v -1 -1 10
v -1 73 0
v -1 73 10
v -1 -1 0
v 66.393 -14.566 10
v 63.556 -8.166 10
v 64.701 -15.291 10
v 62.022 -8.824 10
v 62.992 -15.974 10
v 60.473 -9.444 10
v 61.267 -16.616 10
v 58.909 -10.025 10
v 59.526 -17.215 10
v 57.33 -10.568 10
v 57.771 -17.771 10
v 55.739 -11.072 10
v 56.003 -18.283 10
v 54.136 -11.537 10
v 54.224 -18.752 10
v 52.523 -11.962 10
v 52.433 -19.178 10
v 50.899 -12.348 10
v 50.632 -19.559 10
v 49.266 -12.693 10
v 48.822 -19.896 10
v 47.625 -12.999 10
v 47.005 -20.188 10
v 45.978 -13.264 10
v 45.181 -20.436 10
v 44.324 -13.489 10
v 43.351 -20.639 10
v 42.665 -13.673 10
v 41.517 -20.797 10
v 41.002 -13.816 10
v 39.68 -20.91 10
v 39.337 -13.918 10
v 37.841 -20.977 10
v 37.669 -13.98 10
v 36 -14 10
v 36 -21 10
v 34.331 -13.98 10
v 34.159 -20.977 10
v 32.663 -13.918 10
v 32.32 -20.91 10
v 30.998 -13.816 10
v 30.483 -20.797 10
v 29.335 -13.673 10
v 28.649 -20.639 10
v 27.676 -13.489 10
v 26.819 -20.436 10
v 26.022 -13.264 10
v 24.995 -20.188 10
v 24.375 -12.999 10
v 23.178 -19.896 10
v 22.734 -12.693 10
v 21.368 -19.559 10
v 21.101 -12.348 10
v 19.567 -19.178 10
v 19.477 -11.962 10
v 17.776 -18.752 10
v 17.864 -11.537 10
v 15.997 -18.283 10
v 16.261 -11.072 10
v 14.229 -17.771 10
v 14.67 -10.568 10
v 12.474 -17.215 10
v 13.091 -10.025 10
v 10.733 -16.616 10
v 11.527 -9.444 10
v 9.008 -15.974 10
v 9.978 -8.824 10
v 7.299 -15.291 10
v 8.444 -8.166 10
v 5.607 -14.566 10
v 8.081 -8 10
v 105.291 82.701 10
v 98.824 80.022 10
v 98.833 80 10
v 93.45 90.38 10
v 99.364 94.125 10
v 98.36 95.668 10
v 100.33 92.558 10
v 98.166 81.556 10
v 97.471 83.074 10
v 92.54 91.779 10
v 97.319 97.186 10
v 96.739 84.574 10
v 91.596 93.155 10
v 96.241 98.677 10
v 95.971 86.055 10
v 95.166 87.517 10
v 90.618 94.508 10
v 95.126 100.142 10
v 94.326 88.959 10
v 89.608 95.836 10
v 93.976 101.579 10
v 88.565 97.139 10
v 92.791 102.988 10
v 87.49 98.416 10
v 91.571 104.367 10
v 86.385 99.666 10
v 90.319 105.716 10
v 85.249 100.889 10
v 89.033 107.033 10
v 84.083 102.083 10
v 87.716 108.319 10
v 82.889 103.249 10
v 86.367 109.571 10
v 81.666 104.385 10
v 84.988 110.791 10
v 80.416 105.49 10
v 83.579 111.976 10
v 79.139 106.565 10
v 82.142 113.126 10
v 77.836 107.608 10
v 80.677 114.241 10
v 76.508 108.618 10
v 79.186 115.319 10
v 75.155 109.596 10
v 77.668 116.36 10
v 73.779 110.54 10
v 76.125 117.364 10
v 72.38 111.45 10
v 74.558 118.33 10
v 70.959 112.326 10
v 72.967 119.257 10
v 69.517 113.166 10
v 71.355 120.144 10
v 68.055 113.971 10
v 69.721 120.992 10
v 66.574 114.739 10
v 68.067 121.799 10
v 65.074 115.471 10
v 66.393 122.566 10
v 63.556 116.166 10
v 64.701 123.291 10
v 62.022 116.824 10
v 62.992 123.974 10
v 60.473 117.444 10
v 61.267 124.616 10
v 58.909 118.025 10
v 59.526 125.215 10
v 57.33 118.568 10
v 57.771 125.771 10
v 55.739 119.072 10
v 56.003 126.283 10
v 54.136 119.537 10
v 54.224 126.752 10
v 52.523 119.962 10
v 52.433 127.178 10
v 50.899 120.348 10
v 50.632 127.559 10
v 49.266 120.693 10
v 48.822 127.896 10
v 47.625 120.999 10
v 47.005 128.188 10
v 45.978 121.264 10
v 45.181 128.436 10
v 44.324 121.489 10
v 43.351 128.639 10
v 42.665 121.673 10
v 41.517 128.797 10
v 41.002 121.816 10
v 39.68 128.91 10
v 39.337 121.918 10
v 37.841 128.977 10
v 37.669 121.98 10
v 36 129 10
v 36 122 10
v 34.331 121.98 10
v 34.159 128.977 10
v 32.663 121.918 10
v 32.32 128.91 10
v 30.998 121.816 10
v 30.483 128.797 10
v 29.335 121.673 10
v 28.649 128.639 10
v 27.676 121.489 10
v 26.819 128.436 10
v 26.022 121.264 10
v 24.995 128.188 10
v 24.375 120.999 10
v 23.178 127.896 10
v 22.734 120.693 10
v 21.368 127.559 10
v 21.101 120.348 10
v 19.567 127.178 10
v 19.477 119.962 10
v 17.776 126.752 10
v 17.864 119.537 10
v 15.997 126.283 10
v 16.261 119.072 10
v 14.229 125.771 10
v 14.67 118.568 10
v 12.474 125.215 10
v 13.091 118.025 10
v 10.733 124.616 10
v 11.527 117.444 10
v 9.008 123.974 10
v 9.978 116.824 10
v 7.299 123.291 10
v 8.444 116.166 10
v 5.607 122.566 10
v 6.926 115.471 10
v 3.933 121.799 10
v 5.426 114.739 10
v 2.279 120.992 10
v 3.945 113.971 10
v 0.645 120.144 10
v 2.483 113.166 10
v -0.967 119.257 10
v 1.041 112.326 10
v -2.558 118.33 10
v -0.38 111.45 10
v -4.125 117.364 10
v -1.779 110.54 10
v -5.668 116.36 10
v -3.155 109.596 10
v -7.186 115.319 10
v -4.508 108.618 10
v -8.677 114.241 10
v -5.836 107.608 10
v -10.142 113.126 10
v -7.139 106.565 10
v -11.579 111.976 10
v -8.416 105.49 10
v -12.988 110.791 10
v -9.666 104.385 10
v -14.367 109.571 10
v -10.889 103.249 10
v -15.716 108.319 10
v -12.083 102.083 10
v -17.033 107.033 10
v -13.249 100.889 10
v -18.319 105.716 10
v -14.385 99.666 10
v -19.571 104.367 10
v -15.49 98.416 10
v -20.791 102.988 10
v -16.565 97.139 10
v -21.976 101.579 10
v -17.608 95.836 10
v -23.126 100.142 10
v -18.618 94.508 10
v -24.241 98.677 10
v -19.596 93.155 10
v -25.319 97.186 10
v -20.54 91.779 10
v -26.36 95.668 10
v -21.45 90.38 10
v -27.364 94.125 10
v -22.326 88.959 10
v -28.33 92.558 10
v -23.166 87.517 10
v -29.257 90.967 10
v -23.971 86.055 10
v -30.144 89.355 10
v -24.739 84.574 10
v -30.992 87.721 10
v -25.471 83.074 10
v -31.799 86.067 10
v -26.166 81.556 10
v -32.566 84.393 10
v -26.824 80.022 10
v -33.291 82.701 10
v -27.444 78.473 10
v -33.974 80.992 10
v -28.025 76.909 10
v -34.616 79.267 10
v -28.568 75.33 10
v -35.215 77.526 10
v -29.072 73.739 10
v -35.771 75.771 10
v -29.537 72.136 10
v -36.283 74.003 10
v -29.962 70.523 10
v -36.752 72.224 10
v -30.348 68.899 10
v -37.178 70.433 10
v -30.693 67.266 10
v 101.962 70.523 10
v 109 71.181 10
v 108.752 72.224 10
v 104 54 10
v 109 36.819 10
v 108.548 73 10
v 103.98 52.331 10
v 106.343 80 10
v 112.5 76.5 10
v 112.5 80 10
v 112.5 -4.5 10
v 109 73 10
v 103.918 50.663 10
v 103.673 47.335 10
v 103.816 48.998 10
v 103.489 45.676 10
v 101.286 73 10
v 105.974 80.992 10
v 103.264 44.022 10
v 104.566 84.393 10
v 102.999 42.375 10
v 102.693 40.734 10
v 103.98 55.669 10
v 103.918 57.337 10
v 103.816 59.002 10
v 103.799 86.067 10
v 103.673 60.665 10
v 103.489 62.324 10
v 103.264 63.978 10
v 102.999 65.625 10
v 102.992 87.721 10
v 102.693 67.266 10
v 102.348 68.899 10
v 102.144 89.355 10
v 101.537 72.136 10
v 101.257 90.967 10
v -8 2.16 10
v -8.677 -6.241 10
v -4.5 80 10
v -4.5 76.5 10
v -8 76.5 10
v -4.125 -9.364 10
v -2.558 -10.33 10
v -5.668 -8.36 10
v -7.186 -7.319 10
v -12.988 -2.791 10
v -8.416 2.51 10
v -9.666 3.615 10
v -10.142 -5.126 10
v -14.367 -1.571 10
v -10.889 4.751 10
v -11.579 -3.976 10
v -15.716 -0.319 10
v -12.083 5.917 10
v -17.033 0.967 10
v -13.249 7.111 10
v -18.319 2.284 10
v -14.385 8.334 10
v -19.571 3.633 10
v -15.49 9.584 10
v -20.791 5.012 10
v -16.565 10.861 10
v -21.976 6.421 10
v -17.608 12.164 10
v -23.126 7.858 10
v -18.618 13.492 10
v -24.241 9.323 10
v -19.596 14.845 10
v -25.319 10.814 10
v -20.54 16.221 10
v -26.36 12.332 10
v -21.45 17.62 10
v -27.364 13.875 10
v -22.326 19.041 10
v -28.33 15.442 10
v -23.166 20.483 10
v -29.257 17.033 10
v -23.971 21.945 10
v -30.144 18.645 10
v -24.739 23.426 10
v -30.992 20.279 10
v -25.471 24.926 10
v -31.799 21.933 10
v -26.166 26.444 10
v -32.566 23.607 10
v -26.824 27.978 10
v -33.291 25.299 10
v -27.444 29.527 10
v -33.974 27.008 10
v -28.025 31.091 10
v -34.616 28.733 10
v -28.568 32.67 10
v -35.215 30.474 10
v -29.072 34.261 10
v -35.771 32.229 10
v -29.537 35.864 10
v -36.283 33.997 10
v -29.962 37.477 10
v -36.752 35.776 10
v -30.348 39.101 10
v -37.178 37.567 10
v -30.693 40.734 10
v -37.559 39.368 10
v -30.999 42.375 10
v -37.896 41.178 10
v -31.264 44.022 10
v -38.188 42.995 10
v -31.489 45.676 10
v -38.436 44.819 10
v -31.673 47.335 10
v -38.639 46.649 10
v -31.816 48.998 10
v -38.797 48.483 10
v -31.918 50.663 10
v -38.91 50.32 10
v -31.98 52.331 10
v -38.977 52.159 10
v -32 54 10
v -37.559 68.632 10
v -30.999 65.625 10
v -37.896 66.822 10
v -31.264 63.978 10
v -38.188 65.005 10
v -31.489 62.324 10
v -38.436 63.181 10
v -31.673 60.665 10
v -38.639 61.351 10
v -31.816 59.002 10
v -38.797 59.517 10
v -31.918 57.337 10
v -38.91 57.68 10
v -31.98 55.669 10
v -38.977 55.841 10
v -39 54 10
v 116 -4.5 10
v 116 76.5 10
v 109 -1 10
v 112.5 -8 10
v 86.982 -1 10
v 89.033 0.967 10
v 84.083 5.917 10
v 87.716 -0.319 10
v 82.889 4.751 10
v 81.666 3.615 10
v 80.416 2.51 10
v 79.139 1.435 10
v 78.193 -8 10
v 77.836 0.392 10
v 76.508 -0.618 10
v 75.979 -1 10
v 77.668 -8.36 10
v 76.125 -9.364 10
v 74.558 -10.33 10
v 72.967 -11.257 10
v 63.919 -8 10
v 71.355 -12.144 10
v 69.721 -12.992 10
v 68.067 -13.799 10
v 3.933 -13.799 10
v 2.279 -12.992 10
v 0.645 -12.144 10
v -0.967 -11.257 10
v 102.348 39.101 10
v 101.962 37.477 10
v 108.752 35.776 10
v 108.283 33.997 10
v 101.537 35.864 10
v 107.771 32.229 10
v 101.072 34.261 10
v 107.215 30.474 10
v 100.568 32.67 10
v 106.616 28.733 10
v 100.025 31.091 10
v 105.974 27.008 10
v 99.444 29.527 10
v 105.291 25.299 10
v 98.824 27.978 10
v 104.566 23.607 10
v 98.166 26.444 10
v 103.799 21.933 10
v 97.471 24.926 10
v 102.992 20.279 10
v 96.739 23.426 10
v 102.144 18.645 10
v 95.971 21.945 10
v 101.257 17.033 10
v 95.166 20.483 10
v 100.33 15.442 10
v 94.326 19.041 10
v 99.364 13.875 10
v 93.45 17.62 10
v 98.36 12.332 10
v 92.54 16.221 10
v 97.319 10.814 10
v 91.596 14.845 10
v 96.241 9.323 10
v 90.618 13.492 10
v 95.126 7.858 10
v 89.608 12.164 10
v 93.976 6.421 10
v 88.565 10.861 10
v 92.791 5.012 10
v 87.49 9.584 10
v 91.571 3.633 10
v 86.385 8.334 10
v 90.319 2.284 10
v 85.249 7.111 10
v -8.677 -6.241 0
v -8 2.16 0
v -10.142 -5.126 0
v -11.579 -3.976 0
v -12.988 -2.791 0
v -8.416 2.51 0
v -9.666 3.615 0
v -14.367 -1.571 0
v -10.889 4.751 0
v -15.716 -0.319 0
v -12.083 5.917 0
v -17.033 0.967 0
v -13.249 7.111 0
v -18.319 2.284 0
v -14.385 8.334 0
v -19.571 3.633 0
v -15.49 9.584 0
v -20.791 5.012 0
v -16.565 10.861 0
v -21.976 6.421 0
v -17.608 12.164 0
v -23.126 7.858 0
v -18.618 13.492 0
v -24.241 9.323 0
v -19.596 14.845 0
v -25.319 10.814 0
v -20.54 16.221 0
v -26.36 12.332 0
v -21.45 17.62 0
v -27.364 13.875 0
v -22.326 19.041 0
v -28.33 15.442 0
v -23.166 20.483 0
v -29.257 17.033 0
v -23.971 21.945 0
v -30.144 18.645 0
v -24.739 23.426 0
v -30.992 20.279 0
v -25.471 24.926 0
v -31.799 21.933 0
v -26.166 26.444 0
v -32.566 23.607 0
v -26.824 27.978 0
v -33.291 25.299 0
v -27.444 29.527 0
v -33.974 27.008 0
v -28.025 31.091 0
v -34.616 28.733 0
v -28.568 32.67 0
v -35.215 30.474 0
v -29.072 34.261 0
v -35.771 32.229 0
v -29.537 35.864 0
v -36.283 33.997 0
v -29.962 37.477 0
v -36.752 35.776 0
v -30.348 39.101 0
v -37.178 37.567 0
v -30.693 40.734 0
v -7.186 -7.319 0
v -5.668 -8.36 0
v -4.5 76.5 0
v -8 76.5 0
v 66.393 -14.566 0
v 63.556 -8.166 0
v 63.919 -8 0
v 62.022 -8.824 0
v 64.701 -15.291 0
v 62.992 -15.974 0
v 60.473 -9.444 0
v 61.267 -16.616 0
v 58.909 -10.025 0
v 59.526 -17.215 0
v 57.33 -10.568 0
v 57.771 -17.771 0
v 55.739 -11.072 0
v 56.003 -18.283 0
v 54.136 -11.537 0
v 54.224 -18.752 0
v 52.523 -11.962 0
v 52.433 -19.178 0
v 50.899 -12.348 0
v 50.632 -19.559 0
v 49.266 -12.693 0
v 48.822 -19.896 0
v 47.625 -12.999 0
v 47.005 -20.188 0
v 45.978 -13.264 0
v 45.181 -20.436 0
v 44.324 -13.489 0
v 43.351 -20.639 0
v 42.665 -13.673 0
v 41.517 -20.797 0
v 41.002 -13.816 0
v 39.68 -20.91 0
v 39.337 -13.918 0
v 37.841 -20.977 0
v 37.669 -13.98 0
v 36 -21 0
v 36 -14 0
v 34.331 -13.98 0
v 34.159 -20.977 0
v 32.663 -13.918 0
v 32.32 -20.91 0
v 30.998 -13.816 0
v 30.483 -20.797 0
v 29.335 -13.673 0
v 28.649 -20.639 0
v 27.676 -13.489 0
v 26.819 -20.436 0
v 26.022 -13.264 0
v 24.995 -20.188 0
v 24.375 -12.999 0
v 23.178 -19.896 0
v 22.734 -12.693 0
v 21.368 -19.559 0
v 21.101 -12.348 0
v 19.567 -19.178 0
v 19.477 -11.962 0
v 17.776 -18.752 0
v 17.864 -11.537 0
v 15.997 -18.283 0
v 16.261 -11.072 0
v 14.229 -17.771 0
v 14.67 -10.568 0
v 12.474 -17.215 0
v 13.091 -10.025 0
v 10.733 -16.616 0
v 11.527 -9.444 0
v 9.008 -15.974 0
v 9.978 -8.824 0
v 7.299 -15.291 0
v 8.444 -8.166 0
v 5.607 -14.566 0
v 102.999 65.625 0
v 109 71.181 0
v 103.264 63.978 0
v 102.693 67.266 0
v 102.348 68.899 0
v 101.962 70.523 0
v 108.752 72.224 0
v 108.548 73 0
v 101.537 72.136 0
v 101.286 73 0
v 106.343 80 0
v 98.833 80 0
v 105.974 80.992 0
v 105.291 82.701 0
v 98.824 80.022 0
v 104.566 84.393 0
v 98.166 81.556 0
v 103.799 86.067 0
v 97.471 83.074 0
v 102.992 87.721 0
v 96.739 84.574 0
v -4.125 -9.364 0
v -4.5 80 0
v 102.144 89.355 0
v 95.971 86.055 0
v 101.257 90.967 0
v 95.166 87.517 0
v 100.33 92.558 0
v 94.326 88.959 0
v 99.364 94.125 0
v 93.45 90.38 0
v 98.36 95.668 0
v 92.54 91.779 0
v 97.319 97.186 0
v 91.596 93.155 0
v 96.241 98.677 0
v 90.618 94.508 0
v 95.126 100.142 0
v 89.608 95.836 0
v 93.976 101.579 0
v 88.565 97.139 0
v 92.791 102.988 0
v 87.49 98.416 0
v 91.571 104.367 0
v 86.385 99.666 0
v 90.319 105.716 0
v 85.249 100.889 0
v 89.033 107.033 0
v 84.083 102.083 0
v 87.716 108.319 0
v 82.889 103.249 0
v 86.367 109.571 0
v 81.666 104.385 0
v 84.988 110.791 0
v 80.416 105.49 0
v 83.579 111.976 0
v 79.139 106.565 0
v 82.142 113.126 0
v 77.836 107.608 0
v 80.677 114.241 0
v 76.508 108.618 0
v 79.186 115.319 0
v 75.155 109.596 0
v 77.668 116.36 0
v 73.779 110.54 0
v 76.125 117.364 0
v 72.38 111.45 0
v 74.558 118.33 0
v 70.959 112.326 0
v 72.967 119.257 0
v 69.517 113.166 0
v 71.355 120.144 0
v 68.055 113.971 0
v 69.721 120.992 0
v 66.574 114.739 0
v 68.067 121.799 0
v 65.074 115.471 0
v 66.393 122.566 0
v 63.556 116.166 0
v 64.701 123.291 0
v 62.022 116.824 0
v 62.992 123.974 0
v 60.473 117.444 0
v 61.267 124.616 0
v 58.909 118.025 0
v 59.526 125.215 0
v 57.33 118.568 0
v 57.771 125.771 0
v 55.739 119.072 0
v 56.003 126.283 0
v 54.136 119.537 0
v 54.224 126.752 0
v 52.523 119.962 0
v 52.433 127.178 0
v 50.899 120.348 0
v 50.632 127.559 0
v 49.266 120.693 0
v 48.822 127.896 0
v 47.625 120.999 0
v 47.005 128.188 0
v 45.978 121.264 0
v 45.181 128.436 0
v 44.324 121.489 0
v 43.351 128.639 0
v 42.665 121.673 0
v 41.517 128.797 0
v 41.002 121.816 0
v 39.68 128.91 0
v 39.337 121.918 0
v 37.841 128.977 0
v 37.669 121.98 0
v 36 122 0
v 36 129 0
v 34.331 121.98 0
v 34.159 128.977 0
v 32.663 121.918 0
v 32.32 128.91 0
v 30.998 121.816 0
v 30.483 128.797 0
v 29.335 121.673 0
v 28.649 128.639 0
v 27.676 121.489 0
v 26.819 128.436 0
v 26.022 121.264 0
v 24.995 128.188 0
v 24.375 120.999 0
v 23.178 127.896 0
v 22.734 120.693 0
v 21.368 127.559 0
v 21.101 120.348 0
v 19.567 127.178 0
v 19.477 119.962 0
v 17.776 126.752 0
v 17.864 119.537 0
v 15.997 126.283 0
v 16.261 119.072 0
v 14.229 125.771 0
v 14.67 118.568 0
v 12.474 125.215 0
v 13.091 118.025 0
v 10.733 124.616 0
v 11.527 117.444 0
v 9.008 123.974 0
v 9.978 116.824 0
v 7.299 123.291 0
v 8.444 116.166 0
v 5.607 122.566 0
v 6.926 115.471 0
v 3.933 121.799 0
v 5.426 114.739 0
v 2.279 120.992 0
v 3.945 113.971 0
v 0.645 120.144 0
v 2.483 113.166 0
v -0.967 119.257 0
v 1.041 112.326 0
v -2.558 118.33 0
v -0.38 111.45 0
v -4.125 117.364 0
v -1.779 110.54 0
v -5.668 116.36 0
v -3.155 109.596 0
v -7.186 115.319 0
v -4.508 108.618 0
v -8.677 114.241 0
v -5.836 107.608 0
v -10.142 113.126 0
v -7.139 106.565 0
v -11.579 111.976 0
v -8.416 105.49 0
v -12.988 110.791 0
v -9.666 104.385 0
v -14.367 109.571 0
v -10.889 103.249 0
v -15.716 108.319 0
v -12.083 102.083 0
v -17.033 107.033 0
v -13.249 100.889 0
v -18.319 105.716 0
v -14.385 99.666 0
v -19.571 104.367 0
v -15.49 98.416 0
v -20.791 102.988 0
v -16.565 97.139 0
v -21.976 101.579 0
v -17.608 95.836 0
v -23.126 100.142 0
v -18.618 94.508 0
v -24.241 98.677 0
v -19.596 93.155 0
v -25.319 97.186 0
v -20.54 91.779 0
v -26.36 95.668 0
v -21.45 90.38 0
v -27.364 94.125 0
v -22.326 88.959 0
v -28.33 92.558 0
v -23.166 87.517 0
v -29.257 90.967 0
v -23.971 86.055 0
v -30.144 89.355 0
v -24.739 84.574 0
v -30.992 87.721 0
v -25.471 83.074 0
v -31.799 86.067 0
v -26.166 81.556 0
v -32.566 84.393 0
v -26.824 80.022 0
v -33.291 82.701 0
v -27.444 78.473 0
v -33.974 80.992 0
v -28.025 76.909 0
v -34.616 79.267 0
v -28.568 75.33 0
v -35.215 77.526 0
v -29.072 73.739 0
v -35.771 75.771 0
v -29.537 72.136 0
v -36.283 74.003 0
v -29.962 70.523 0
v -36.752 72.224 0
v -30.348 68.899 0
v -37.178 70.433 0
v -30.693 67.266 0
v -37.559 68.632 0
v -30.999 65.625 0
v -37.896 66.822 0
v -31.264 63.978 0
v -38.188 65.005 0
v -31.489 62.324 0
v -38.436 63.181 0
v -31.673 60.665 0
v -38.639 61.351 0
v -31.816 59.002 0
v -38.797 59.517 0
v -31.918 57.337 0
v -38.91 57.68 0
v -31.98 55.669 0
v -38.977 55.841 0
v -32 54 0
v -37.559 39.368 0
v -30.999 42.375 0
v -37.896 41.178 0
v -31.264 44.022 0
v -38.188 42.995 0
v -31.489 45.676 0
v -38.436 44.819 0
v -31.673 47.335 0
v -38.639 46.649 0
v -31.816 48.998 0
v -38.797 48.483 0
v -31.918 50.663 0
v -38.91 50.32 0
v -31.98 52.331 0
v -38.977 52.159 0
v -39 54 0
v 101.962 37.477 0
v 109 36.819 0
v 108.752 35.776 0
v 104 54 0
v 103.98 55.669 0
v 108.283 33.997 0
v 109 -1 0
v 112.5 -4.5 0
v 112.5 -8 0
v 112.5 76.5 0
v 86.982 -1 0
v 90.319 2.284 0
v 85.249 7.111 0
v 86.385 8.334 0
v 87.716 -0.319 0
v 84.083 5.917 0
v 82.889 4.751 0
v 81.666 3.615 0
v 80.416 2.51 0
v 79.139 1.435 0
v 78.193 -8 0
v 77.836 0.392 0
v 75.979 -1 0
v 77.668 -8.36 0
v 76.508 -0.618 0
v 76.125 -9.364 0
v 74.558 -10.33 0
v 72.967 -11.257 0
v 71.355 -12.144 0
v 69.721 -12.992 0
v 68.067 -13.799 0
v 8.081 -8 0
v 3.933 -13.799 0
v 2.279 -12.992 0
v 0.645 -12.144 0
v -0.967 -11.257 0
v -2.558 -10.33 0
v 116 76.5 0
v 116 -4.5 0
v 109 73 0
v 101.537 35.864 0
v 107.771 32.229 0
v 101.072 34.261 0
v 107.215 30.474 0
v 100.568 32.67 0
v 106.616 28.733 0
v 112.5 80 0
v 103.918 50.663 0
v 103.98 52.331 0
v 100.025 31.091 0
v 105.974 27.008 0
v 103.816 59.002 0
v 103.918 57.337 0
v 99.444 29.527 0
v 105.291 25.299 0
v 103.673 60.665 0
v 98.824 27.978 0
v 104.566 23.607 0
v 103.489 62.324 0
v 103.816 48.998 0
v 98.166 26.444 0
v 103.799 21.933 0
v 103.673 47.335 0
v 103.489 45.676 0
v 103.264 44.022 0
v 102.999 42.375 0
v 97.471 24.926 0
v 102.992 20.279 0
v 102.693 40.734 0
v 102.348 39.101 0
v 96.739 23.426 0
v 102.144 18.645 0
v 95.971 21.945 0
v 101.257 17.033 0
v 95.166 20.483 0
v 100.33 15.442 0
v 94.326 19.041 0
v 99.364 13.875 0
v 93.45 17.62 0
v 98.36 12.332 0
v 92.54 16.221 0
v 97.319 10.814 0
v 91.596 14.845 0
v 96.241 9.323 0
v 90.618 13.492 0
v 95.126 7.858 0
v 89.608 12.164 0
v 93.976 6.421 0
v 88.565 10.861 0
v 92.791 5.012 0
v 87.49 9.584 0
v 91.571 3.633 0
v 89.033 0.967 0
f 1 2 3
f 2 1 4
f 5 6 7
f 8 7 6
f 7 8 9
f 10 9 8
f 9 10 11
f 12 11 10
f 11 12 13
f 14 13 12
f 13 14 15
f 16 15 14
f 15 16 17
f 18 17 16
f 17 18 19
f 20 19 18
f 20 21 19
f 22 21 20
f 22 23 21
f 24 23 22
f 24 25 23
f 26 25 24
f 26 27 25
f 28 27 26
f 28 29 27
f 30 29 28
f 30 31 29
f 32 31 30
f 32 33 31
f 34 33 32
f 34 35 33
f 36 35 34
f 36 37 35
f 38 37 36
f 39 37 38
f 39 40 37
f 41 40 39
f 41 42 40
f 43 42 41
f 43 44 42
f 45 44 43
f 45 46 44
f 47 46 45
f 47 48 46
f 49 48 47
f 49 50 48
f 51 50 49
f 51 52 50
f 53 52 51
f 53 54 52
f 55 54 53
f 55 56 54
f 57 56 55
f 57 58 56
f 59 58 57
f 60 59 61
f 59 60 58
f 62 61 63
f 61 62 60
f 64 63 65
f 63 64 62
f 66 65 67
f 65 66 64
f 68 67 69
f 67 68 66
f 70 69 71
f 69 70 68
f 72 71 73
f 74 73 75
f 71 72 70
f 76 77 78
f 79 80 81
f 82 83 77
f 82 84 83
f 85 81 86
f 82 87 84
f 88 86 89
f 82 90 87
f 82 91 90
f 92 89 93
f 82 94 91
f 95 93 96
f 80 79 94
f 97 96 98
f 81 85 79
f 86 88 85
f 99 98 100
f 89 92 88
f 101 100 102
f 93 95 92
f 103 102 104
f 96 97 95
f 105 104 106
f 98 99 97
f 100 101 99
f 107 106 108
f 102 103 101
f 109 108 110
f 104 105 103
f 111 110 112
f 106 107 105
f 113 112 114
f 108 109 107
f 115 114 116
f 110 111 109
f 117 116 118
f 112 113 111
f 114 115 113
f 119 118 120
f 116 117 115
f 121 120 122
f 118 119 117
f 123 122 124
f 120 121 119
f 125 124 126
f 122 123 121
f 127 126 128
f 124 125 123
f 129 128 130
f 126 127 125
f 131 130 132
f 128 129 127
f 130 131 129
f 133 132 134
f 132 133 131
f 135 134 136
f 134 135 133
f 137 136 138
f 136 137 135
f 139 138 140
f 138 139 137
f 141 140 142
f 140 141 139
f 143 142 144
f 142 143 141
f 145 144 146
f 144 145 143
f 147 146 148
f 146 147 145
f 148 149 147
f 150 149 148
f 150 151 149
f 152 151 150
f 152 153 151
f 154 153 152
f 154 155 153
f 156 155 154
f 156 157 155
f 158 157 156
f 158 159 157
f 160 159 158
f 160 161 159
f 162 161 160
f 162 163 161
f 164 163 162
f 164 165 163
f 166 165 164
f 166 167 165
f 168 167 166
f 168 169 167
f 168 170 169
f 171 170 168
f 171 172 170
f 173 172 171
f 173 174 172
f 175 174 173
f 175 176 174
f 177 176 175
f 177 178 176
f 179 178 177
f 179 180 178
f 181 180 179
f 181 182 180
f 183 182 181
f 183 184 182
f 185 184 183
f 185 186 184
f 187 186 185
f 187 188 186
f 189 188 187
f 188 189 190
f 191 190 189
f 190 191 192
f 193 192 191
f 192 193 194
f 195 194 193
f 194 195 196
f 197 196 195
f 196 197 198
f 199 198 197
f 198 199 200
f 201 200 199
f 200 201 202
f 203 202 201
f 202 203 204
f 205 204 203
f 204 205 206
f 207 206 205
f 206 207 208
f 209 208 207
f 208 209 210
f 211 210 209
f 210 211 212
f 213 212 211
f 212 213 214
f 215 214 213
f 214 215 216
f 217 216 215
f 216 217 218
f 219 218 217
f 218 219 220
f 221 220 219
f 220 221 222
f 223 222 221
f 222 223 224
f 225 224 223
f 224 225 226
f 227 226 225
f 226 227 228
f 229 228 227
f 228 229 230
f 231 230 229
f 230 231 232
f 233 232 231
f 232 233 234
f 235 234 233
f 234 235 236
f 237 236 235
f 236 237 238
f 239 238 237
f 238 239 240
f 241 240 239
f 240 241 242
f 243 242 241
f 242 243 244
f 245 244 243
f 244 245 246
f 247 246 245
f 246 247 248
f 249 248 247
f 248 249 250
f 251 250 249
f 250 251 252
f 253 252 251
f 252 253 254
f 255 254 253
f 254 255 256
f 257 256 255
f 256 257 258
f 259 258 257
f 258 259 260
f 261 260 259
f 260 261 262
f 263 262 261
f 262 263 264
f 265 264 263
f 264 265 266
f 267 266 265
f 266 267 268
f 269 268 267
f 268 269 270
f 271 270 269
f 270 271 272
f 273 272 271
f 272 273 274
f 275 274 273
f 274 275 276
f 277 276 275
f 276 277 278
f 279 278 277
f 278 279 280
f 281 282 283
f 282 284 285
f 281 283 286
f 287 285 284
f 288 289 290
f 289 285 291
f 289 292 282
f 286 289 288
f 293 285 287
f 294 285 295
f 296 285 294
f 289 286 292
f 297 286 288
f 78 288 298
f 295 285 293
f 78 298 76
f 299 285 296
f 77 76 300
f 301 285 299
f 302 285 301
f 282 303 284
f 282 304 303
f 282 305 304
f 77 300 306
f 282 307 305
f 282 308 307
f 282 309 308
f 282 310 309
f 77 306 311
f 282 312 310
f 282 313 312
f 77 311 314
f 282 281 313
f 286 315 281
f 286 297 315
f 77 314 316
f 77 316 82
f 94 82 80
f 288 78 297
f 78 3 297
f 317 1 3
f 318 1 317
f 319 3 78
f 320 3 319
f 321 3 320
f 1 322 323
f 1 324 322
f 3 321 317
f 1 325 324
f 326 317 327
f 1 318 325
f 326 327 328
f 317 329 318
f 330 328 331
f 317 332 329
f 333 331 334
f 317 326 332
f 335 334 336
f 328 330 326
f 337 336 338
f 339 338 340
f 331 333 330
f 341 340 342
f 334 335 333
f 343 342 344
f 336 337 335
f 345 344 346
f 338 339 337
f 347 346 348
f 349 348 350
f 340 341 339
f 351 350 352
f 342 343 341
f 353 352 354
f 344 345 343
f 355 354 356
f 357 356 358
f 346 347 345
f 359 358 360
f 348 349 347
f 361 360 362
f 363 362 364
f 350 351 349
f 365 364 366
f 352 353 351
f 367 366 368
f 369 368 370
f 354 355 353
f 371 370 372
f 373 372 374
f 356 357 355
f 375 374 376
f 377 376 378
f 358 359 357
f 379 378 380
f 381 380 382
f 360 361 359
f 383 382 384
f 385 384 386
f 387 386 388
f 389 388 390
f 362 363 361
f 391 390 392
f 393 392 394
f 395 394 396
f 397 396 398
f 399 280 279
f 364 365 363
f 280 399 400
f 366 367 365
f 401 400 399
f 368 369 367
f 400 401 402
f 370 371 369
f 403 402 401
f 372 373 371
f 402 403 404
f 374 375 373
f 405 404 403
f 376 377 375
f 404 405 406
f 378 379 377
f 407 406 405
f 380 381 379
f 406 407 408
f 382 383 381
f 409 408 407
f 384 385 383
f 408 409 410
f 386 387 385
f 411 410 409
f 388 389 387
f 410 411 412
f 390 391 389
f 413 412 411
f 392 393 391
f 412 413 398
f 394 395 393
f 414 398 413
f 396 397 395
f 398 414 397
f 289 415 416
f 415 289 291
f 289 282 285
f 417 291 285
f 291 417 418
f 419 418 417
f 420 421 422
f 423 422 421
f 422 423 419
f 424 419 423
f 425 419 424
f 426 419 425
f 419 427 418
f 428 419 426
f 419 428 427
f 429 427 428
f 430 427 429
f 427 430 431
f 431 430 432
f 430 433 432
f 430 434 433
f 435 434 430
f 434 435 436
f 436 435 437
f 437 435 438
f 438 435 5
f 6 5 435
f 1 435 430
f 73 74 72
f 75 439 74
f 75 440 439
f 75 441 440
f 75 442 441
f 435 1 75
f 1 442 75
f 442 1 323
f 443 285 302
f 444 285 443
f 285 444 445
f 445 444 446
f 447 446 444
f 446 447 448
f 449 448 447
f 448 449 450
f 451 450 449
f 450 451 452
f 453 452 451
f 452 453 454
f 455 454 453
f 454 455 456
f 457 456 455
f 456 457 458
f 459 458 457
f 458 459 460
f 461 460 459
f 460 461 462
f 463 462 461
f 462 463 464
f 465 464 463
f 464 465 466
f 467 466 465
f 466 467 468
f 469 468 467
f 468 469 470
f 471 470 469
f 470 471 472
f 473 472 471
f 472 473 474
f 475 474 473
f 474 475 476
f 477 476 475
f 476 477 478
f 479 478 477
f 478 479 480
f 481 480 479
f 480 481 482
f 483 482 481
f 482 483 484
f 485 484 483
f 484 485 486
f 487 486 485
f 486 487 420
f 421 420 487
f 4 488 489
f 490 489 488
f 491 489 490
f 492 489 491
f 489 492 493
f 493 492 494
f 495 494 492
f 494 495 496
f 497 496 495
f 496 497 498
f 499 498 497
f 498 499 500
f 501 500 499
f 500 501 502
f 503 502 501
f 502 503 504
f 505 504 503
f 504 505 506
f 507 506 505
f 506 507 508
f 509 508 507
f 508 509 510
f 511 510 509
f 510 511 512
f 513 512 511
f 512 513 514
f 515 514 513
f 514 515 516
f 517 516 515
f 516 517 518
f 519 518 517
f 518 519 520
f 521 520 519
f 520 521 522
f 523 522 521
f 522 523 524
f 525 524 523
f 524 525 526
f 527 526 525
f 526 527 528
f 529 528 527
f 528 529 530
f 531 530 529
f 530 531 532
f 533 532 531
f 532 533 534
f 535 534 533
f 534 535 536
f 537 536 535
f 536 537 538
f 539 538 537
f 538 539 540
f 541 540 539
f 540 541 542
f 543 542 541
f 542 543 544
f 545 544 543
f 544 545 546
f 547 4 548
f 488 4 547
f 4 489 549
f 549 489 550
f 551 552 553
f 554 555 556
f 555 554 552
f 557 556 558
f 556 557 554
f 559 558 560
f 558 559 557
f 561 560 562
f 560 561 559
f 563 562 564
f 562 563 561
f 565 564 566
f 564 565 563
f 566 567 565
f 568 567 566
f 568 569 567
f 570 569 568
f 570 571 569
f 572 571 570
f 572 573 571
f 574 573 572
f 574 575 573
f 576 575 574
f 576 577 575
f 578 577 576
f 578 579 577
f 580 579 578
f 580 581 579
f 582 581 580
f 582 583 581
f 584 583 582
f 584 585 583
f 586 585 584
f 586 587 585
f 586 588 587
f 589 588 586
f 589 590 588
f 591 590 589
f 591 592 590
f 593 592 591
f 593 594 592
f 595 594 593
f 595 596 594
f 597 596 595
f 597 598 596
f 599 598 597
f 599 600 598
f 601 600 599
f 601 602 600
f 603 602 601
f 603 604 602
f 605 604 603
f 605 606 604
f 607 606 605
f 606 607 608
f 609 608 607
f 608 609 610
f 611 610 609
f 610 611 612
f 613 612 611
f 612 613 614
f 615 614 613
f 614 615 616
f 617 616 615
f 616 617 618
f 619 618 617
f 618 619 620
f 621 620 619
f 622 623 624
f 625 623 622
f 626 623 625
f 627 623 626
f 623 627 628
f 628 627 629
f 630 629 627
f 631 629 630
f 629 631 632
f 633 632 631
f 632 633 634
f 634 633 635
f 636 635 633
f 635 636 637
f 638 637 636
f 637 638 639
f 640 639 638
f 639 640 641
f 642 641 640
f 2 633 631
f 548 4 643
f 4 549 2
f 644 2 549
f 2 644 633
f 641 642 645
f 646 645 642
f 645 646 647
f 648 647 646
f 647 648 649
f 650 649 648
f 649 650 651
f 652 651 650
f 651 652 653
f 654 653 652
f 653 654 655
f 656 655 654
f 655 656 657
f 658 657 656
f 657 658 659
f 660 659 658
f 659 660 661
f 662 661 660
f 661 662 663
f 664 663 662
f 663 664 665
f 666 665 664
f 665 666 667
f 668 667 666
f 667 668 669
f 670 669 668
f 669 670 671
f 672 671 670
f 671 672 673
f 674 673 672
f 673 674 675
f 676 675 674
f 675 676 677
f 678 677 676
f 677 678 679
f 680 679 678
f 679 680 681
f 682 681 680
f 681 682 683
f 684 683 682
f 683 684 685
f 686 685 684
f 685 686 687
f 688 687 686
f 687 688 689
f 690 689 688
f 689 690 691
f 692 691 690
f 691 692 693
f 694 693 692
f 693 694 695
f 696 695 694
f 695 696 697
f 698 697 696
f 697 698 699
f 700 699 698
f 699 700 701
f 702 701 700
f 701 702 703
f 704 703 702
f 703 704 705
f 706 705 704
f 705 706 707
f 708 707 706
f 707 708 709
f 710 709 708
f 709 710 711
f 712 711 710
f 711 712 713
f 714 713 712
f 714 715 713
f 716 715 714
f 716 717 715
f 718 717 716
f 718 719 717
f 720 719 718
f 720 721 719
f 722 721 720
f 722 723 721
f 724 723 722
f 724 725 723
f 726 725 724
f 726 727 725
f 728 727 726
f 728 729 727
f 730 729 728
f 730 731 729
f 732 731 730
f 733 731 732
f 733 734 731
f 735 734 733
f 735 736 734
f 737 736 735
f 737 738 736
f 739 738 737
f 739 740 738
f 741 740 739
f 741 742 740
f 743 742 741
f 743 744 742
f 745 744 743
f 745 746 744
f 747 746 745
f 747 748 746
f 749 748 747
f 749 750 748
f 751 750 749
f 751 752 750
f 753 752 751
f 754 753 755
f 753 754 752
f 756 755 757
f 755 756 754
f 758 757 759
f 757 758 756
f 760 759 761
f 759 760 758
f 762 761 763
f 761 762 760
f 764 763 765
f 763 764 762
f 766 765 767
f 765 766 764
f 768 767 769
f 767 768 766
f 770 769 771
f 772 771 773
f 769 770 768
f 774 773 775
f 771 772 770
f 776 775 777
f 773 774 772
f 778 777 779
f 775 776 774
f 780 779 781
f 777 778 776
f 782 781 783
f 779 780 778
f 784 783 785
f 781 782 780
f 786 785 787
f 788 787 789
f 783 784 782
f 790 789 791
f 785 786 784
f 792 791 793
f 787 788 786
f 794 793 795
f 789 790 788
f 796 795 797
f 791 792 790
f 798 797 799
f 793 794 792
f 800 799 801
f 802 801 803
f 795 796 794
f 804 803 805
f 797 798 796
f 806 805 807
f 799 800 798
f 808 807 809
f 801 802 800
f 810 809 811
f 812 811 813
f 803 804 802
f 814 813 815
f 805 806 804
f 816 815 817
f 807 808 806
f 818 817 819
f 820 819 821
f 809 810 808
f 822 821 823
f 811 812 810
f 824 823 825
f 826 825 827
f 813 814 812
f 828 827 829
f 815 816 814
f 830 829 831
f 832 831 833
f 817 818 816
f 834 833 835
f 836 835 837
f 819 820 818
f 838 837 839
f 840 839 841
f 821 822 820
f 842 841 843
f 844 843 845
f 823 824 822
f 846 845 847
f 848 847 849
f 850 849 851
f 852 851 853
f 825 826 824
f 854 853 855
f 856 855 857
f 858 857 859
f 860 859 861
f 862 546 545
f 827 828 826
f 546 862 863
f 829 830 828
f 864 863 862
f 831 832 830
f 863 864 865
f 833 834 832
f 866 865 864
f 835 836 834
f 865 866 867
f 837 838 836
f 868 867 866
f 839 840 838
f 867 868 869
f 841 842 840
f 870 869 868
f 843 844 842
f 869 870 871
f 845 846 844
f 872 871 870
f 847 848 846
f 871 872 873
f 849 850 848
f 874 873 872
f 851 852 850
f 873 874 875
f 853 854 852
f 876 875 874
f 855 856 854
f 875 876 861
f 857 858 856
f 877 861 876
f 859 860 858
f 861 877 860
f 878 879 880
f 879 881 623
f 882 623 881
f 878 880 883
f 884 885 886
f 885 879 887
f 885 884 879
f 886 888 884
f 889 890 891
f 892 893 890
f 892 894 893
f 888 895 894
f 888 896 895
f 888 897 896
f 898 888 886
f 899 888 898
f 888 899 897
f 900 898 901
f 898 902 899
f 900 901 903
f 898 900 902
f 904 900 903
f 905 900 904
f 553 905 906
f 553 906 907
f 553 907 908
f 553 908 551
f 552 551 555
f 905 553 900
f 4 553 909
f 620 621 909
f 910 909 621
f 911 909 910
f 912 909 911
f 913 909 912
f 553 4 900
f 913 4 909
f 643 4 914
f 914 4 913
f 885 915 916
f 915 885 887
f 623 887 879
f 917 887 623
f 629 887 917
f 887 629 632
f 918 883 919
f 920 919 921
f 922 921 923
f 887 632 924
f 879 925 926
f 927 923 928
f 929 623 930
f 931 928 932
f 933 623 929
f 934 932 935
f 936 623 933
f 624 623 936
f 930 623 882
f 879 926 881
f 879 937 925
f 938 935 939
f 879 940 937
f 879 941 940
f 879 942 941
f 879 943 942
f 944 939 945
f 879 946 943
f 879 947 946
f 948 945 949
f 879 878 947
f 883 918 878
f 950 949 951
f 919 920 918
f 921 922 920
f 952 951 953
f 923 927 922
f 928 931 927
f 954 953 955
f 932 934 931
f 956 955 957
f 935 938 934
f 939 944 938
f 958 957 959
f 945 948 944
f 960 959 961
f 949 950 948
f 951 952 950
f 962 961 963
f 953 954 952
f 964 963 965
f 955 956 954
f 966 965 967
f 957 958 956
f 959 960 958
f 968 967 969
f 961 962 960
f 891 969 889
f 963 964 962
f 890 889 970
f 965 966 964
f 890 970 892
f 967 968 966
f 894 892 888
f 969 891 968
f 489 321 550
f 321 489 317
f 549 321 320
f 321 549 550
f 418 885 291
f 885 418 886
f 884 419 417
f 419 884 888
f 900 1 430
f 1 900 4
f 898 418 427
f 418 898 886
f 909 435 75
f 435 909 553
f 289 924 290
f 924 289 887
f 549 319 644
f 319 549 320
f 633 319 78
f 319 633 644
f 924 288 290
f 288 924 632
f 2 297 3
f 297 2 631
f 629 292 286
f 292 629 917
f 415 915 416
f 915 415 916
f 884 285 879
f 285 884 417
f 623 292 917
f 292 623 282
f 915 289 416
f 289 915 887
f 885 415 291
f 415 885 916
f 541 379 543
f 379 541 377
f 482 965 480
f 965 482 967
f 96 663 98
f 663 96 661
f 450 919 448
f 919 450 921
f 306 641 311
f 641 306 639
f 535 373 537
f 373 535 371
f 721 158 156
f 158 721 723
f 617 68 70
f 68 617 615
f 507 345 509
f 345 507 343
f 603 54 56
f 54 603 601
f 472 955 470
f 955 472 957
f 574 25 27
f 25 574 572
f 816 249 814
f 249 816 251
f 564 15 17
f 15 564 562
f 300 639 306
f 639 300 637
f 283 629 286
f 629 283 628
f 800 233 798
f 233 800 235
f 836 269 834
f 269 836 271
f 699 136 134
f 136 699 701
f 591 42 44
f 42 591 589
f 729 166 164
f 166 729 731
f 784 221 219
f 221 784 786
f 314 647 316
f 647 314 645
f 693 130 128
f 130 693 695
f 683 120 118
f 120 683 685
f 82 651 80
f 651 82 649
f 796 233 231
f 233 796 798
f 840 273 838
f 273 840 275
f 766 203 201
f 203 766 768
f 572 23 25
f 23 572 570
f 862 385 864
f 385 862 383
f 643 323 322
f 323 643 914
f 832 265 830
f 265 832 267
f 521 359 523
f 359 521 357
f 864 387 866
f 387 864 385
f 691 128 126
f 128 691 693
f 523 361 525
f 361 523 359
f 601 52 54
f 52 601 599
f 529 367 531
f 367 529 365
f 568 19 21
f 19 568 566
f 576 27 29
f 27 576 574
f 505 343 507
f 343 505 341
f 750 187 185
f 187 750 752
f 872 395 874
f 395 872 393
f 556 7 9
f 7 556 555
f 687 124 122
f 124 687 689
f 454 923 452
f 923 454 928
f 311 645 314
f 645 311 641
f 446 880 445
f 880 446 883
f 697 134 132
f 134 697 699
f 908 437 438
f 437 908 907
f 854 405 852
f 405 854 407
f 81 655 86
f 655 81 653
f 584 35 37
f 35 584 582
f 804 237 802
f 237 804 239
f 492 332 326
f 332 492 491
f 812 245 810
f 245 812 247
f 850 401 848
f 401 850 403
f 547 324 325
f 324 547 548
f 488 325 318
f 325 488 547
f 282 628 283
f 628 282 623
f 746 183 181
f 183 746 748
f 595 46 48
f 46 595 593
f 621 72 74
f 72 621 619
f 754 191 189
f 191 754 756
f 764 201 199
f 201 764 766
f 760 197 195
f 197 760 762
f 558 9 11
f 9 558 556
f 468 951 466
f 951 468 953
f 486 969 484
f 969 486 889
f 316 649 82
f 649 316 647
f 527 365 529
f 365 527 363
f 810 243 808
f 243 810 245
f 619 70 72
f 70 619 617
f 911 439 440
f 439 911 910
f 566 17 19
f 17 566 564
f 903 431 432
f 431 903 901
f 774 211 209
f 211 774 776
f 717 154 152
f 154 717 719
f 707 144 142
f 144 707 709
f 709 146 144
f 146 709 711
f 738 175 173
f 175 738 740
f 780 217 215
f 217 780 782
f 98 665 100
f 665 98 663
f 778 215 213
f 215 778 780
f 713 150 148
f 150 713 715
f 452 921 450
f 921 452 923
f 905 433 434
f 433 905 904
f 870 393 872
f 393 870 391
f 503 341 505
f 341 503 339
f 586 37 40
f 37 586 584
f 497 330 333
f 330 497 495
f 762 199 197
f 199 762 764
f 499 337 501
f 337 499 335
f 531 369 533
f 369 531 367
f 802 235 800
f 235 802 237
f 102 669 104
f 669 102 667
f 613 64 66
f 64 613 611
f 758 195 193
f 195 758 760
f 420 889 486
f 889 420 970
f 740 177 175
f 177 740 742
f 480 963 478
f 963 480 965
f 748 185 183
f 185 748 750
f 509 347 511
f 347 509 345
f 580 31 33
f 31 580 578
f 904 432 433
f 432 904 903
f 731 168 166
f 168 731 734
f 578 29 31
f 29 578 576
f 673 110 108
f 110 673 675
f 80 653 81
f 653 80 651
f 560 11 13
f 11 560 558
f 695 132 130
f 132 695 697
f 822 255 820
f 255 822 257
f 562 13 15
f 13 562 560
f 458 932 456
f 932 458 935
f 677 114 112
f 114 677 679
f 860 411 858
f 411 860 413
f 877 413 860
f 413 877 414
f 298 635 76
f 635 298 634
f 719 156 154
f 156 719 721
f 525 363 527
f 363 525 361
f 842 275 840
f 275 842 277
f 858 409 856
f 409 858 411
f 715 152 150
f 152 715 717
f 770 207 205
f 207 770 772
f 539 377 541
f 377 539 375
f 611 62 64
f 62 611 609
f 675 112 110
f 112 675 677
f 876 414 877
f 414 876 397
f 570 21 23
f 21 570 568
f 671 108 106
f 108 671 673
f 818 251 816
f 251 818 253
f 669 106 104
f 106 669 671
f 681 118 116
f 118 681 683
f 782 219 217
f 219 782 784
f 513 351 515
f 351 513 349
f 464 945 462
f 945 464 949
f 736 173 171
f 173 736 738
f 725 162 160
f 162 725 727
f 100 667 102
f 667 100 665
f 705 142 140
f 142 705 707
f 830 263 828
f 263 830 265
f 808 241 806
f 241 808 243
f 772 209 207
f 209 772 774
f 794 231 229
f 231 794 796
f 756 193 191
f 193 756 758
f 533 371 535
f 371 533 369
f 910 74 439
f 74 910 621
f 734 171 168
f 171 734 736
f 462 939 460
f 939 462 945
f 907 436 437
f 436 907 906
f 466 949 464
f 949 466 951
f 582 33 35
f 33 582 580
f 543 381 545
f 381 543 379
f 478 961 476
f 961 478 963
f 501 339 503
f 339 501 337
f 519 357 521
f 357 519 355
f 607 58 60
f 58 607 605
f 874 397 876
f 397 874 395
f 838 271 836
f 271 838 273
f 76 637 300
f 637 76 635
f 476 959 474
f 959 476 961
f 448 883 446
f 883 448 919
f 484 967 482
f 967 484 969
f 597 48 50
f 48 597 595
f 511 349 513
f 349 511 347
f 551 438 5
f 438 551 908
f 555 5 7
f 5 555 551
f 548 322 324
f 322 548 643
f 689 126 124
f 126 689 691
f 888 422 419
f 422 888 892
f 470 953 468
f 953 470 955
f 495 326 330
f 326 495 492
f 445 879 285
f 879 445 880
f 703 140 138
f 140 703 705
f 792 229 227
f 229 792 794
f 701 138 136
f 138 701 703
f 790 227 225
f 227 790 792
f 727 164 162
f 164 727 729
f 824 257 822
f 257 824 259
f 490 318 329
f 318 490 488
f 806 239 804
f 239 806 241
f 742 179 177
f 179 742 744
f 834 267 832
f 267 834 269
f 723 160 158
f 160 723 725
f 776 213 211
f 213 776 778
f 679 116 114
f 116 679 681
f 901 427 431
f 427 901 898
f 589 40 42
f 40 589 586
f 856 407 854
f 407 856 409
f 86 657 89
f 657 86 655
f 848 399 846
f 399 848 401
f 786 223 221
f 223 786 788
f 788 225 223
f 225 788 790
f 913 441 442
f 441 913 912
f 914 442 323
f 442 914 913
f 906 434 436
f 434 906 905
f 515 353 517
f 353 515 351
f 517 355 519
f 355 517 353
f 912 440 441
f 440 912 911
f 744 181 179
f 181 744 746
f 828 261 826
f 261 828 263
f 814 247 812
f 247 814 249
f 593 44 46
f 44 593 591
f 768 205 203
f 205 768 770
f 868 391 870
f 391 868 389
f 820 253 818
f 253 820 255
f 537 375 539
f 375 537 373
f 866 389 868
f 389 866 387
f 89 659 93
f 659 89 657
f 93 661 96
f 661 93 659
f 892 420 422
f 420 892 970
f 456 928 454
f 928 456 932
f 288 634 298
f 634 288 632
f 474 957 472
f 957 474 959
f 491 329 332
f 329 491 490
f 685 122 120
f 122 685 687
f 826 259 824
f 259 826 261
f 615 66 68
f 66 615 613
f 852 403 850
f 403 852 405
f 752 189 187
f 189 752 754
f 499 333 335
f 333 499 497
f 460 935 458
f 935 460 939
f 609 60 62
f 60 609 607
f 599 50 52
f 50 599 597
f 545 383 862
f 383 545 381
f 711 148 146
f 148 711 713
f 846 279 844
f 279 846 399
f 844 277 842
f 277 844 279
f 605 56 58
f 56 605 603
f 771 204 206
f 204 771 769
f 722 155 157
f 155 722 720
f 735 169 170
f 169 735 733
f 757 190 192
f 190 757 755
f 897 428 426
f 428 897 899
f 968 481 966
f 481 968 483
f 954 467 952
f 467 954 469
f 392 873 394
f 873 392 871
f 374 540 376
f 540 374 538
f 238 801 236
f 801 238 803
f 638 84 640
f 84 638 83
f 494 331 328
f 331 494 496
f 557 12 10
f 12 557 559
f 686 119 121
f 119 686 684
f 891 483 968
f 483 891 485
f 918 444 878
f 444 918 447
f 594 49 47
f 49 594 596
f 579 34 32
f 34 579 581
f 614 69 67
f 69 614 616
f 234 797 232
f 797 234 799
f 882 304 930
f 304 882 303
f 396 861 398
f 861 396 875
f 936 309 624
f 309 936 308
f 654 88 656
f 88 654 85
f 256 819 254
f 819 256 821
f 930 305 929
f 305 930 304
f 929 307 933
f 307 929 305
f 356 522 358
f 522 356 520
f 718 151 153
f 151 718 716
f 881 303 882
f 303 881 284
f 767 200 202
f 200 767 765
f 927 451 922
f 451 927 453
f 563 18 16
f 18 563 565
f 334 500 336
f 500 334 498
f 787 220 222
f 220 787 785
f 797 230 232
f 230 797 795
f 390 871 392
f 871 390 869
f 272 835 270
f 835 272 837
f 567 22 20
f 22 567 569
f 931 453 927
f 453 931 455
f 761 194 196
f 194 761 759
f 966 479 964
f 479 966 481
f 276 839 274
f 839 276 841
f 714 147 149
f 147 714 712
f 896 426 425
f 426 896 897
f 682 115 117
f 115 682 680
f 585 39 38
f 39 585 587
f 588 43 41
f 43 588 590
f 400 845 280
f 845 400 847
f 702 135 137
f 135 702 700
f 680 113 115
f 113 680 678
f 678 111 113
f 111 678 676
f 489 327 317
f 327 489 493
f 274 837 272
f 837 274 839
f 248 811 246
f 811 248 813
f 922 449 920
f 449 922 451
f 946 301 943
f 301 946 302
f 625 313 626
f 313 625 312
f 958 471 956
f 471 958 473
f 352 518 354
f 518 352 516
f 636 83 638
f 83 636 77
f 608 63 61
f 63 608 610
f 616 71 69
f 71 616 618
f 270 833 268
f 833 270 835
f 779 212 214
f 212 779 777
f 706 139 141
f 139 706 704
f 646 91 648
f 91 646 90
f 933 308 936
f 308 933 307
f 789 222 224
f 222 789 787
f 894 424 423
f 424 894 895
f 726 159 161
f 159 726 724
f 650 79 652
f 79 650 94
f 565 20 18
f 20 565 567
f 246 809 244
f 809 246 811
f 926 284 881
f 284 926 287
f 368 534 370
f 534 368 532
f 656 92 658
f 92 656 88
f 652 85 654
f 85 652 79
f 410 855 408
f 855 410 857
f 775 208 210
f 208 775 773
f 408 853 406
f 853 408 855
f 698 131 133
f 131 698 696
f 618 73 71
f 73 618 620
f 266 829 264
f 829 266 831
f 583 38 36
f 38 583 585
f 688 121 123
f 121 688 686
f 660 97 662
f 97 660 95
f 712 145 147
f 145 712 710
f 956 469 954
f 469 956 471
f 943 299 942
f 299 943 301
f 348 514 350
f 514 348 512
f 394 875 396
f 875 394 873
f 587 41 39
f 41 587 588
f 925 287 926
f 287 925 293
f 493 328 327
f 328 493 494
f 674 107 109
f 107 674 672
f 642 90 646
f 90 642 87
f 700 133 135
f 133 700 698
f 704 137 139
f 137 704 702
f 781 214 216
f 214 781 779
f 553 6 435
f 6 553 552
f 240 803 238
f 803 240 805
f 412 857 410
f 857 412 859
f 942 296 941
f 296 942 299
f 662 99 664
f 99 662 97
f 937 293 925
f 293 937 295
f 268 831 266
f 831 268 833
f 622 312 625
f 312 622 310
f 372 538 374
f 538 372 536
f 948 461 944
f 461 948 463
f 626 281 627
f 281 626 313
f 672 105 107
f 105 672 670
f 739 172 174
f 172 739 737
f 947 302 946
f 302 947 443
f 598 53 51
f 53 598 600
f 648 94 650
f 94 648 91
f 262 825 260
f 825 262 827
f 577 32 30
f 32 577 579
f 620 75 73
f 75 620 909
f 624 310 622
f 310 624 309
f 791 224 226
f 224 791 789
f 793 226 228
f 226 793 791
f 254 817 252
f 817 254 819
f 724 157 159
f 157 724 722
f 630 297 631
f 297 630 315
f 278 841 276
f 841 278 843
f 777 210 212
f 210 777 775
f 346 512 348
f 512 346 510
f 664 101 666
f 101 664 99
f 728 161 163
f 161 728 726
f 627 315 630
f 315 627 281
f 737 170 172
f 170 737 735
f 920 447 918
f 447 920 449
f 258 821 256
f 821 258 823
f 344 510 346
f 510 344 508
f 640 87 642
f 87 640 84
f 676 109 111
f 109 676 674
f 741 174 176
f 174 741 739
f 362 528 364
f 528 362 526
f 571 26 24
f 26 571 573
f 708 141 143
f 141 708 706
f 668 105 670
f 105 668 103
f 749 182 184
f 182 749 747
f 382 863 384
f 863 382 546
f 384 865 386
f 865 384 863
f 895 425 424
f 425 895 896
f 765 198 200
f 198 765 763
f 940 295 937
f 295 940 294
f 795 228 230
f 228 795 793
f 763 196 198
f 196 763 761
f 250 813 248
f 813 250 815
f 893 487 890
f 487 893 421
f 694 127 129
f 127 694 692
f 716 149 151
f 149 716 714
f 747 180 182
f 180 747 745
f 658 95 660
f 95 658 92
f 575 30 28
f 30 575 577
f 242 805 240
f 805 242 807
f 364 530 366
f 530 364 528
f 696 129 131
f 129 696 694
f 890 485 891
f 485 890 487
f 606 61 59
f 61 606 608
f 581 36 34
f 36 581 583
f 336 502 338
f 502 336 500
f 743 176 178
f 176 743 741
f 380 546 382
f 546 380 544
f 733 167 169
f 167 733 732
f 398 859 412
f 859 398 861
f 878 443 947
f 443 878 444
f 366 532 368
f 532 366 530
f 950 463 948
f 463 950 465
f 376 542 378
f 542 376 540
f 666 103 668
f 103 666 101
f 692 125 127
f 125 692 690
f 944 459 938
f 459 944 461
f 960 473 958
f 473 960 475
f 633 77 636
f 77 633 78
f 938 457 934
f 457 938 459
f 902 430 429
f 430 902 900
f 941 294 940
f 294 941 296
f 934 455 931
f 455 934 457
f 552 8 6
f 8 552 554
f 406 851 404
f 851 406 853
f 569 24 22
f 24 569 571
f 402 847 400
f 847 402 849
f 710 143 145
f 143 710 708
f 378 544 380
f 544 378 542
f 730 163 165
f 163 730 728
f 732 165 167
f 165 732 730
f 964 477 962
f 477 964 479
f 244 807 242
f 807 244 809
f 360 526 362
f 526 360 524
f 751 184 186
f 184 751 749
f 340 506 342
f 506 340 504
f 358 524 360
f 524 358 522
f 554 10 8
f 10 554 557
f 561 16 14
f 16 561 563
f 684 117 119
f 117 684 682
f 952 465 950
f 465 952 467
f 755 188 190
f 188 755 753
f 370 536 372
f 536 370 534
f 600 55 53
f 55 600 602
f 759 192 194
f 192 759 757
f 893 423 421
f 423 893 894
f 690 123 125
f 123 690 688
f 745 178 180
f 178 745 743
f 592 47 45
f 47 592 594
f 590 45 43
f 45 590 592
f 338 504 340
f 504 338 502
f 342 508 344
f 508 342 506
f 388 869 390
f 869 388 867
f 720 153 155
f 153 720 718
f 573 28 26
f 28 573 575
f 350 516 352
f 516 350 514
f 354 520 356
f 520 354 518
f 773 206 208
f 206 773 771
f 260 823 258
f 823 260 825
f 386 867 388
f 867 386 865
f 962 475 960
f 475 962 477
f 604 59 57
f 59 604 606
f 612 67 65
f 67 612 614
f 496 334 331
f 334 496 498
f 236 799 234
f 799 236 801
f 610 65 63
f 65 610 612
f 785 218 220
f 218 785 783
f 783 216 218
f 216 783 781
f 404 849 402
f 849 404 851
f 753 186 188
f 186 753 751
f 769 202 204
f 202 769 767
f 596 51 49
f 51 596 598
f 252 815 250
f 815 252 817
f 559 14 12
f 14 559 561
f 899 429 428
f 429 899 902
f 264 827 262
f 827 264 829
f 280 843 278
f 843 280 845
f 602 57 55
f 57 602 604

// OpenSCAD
// Generated by SolidPython 1.1.3 on 2026-07-06 20:41:27


union() {
	union() {
		translate(v = [-4.5000000000, 36.0000000000, 5.0000000000]) {
			cube(center = true, size = [7, 81, 10]);
		}
		translate(v = [54.0000000000, -4.5000000000, 5.0000000000]) {
			cube(center = true, size = [117, 7, 10]);
		}
		translate(v = [0, 81]) {
			translate(v = [54.0000000000, -4.5000000000, 5.0000000000]) {
				cube(center = true, size = [117, 7, 10]);
			}
		}
		translate(v = [117, 0]) {
			translate(v = [-4.5000000000, 36.0000000000, 5.0000000000]) {
				cube(center = true, size = [7, 81, 10]);
			}
		}
	}
	translate(v = [36.0000000000, 54.0000000000]) {
		difference() {
			cylinder($fn = 256, h = 10, r = 75.0000000000);
			cylinder($fn = 256, h = 10, r = 68.0000000000);
		}
	}
}
/***********************************************
*********      SolidPython code:      **********
************************************************

"""SCAD file export functions.

This module provides functions for exporting OpenSCAD geometries to .scad files.
"""

from typing import Dict, Optional
from pathlib import Path
import solid

from .config import ExportConfiguration, FileNamingConfig


def export_scad(
    geometry: solid.OpenSCADObject, output_path: Path, header: Optional[str] = None
) -> Path:
    """Export geometry to SCAD file.

    Parameters
    ----------
    geometry : solid.OpenSCADObject
        Geometry to export.
    output_path : Path
        Output file path.
    header : str, optional
        Header comment to add to SCAD file.

    Returns
    -------
    Path
        Path to created SCAD file.

    Raises
    ------
    IOError
        If file cannot be written.

    Examples
    --------
    >>> from pathlib import Path
    >>> import solid
    >>>
    >>> geometry = solid.cube([10, 10, 10])
    >>> output_path = Path('output/device.scad')
    >>> export_scad(geometry, output_path)
    """
    # Ensure parent directory exists
    output_path.parent.mkdir(parents=True, exist_ok=True)

    # Render to file
    try:
        solid.scad_render_to_file(geometry, str(output_path))
    except Exception as e:
        raise IOError(f"Failed to write SCAD file to {output_path}: {e}")

    _normalize_scad_file(output_path)

    # Add header if provided
    if header:
        _add_header_to_scad(output_path, header)
        _normalize_scad_file(output_path)

    return output_path


def _normalize_scad_file(scad_path: Path) -> None:
    """Strip trailing whitespace from generated SCAD text."""
    content = scad_path.read_text()
    normalized = "\n".join(line.rstrip() for line in content.splitlines()) + "\n"
    if normalized != content:
        scad_path.write_text(normalized)


def export_multiple_scad(
    geometries: Dict[str, solid.OpenSCADObject],
    config: ExportConfiguration,
    naming_config: Optional[FileNamingConfig] = None,
) -> Dict[str, Path]:
    """Export multiple geometries to SCAD files.

    Parameters
    ----------
    geometries : dict
        Dictionary mapping prefixes to geometries.
        Keys are used as filename prefixes.
    config : ExportConfiguration
        Export configuration.
    naming_config : FileNamingConfig, optional
        File naming configuration.

    Returns
    -------
    dict
        Dictionary mapping prefixes to output paths.

    Examples
    --------
    >>> geometries = {
    ...     'wells': wells_geometry,
    ...     'channels': channels_geometry,
    ...     'device': device_geometry
    ... }
    >>> config = ExportConfiguration(output_directory=Path('output'))
    >>> paths = export_multiple_scad(geometries, config)
    """
    output_paths = {}

    for prefix, geometry in geometries.items():
        # Create naming config for this geometry
        if naming_config:
            file_config = FileNamingConfig(
                prefix=prefix,
                version=naming_config.version,
                grid_size=naming_config.grid_size,
                suffix=naming_config.suffix,
            )
        else:
            file_config = FileNamingConfig(prefix=prefix)

        # Generate filename
        filename = file_config.generate_filename("scad")
        output_path = config.get_output_path(filename)

        # Export
        export_scad(geometry, output_path)
        output_paths[prefix] = output_path

    return output_paths


def _add_header_to_scad(scad_path: Path, header: str):
    """Add header comment to existing SCAD file.

    Parameters
    ----------
    scad_path : Path
        Path to SCAD file.
    header : str
        Header text to add.
    """
    # Read existing content
    with open(scad_path, "r") as f:
        content = f.read()

    # Prepend header
    header_comment = f"// {header}\n\n"
    with open(scad_path, "w") as f:
        f.write(header_comment + content)


def generate_scad_header(
    device_name: str, version: Optional[str] = None, description: Optional[str] = None
) -> str:
    """Generate SCAD file header comment.

    Parameters
    ----------
    device_name : str
        Device name.
    version : str, optional
        Version string.
    description : str, optional
        Device description.

    Returns
    -------
    str
        Header comment text.

    Examples
    --------
    >>> header = generate_scad_header(
    ...     'Two Compartment Device',
    ...     version='v1',
    ...     description='96-well format with microchannels'
    ... )
    """
    lines = []
    lines.append("=" * 60)
    lines.append(f"Device: {device_name}")

    if version:
        lines.append(f"Version: {version}")

    if description:
        lines.append(f"Description: {description}")

    lines.append("Generated by OpenMFD")
    lines.append("=" * 60)

    return "\n".join(lines)


def validate_scad_file(scad_path: Path) -> bool:
    """Validate that SCAD file exists and is readable.

    Parameters
    ----------
    scad_path : Path
        Path to SCAD file.

    Returns
    -------
    bool
        True if file is valid, False otherwise.
    """
    if not scad_path.exists():
        return False

    if not scad_path.is_file():
        return False

    # Try to read file
    try:
        with open(scad_path, "r") as f:
            content = f.read()
        return len(content) > 0
    except Exception:
        return False


************************************************/
